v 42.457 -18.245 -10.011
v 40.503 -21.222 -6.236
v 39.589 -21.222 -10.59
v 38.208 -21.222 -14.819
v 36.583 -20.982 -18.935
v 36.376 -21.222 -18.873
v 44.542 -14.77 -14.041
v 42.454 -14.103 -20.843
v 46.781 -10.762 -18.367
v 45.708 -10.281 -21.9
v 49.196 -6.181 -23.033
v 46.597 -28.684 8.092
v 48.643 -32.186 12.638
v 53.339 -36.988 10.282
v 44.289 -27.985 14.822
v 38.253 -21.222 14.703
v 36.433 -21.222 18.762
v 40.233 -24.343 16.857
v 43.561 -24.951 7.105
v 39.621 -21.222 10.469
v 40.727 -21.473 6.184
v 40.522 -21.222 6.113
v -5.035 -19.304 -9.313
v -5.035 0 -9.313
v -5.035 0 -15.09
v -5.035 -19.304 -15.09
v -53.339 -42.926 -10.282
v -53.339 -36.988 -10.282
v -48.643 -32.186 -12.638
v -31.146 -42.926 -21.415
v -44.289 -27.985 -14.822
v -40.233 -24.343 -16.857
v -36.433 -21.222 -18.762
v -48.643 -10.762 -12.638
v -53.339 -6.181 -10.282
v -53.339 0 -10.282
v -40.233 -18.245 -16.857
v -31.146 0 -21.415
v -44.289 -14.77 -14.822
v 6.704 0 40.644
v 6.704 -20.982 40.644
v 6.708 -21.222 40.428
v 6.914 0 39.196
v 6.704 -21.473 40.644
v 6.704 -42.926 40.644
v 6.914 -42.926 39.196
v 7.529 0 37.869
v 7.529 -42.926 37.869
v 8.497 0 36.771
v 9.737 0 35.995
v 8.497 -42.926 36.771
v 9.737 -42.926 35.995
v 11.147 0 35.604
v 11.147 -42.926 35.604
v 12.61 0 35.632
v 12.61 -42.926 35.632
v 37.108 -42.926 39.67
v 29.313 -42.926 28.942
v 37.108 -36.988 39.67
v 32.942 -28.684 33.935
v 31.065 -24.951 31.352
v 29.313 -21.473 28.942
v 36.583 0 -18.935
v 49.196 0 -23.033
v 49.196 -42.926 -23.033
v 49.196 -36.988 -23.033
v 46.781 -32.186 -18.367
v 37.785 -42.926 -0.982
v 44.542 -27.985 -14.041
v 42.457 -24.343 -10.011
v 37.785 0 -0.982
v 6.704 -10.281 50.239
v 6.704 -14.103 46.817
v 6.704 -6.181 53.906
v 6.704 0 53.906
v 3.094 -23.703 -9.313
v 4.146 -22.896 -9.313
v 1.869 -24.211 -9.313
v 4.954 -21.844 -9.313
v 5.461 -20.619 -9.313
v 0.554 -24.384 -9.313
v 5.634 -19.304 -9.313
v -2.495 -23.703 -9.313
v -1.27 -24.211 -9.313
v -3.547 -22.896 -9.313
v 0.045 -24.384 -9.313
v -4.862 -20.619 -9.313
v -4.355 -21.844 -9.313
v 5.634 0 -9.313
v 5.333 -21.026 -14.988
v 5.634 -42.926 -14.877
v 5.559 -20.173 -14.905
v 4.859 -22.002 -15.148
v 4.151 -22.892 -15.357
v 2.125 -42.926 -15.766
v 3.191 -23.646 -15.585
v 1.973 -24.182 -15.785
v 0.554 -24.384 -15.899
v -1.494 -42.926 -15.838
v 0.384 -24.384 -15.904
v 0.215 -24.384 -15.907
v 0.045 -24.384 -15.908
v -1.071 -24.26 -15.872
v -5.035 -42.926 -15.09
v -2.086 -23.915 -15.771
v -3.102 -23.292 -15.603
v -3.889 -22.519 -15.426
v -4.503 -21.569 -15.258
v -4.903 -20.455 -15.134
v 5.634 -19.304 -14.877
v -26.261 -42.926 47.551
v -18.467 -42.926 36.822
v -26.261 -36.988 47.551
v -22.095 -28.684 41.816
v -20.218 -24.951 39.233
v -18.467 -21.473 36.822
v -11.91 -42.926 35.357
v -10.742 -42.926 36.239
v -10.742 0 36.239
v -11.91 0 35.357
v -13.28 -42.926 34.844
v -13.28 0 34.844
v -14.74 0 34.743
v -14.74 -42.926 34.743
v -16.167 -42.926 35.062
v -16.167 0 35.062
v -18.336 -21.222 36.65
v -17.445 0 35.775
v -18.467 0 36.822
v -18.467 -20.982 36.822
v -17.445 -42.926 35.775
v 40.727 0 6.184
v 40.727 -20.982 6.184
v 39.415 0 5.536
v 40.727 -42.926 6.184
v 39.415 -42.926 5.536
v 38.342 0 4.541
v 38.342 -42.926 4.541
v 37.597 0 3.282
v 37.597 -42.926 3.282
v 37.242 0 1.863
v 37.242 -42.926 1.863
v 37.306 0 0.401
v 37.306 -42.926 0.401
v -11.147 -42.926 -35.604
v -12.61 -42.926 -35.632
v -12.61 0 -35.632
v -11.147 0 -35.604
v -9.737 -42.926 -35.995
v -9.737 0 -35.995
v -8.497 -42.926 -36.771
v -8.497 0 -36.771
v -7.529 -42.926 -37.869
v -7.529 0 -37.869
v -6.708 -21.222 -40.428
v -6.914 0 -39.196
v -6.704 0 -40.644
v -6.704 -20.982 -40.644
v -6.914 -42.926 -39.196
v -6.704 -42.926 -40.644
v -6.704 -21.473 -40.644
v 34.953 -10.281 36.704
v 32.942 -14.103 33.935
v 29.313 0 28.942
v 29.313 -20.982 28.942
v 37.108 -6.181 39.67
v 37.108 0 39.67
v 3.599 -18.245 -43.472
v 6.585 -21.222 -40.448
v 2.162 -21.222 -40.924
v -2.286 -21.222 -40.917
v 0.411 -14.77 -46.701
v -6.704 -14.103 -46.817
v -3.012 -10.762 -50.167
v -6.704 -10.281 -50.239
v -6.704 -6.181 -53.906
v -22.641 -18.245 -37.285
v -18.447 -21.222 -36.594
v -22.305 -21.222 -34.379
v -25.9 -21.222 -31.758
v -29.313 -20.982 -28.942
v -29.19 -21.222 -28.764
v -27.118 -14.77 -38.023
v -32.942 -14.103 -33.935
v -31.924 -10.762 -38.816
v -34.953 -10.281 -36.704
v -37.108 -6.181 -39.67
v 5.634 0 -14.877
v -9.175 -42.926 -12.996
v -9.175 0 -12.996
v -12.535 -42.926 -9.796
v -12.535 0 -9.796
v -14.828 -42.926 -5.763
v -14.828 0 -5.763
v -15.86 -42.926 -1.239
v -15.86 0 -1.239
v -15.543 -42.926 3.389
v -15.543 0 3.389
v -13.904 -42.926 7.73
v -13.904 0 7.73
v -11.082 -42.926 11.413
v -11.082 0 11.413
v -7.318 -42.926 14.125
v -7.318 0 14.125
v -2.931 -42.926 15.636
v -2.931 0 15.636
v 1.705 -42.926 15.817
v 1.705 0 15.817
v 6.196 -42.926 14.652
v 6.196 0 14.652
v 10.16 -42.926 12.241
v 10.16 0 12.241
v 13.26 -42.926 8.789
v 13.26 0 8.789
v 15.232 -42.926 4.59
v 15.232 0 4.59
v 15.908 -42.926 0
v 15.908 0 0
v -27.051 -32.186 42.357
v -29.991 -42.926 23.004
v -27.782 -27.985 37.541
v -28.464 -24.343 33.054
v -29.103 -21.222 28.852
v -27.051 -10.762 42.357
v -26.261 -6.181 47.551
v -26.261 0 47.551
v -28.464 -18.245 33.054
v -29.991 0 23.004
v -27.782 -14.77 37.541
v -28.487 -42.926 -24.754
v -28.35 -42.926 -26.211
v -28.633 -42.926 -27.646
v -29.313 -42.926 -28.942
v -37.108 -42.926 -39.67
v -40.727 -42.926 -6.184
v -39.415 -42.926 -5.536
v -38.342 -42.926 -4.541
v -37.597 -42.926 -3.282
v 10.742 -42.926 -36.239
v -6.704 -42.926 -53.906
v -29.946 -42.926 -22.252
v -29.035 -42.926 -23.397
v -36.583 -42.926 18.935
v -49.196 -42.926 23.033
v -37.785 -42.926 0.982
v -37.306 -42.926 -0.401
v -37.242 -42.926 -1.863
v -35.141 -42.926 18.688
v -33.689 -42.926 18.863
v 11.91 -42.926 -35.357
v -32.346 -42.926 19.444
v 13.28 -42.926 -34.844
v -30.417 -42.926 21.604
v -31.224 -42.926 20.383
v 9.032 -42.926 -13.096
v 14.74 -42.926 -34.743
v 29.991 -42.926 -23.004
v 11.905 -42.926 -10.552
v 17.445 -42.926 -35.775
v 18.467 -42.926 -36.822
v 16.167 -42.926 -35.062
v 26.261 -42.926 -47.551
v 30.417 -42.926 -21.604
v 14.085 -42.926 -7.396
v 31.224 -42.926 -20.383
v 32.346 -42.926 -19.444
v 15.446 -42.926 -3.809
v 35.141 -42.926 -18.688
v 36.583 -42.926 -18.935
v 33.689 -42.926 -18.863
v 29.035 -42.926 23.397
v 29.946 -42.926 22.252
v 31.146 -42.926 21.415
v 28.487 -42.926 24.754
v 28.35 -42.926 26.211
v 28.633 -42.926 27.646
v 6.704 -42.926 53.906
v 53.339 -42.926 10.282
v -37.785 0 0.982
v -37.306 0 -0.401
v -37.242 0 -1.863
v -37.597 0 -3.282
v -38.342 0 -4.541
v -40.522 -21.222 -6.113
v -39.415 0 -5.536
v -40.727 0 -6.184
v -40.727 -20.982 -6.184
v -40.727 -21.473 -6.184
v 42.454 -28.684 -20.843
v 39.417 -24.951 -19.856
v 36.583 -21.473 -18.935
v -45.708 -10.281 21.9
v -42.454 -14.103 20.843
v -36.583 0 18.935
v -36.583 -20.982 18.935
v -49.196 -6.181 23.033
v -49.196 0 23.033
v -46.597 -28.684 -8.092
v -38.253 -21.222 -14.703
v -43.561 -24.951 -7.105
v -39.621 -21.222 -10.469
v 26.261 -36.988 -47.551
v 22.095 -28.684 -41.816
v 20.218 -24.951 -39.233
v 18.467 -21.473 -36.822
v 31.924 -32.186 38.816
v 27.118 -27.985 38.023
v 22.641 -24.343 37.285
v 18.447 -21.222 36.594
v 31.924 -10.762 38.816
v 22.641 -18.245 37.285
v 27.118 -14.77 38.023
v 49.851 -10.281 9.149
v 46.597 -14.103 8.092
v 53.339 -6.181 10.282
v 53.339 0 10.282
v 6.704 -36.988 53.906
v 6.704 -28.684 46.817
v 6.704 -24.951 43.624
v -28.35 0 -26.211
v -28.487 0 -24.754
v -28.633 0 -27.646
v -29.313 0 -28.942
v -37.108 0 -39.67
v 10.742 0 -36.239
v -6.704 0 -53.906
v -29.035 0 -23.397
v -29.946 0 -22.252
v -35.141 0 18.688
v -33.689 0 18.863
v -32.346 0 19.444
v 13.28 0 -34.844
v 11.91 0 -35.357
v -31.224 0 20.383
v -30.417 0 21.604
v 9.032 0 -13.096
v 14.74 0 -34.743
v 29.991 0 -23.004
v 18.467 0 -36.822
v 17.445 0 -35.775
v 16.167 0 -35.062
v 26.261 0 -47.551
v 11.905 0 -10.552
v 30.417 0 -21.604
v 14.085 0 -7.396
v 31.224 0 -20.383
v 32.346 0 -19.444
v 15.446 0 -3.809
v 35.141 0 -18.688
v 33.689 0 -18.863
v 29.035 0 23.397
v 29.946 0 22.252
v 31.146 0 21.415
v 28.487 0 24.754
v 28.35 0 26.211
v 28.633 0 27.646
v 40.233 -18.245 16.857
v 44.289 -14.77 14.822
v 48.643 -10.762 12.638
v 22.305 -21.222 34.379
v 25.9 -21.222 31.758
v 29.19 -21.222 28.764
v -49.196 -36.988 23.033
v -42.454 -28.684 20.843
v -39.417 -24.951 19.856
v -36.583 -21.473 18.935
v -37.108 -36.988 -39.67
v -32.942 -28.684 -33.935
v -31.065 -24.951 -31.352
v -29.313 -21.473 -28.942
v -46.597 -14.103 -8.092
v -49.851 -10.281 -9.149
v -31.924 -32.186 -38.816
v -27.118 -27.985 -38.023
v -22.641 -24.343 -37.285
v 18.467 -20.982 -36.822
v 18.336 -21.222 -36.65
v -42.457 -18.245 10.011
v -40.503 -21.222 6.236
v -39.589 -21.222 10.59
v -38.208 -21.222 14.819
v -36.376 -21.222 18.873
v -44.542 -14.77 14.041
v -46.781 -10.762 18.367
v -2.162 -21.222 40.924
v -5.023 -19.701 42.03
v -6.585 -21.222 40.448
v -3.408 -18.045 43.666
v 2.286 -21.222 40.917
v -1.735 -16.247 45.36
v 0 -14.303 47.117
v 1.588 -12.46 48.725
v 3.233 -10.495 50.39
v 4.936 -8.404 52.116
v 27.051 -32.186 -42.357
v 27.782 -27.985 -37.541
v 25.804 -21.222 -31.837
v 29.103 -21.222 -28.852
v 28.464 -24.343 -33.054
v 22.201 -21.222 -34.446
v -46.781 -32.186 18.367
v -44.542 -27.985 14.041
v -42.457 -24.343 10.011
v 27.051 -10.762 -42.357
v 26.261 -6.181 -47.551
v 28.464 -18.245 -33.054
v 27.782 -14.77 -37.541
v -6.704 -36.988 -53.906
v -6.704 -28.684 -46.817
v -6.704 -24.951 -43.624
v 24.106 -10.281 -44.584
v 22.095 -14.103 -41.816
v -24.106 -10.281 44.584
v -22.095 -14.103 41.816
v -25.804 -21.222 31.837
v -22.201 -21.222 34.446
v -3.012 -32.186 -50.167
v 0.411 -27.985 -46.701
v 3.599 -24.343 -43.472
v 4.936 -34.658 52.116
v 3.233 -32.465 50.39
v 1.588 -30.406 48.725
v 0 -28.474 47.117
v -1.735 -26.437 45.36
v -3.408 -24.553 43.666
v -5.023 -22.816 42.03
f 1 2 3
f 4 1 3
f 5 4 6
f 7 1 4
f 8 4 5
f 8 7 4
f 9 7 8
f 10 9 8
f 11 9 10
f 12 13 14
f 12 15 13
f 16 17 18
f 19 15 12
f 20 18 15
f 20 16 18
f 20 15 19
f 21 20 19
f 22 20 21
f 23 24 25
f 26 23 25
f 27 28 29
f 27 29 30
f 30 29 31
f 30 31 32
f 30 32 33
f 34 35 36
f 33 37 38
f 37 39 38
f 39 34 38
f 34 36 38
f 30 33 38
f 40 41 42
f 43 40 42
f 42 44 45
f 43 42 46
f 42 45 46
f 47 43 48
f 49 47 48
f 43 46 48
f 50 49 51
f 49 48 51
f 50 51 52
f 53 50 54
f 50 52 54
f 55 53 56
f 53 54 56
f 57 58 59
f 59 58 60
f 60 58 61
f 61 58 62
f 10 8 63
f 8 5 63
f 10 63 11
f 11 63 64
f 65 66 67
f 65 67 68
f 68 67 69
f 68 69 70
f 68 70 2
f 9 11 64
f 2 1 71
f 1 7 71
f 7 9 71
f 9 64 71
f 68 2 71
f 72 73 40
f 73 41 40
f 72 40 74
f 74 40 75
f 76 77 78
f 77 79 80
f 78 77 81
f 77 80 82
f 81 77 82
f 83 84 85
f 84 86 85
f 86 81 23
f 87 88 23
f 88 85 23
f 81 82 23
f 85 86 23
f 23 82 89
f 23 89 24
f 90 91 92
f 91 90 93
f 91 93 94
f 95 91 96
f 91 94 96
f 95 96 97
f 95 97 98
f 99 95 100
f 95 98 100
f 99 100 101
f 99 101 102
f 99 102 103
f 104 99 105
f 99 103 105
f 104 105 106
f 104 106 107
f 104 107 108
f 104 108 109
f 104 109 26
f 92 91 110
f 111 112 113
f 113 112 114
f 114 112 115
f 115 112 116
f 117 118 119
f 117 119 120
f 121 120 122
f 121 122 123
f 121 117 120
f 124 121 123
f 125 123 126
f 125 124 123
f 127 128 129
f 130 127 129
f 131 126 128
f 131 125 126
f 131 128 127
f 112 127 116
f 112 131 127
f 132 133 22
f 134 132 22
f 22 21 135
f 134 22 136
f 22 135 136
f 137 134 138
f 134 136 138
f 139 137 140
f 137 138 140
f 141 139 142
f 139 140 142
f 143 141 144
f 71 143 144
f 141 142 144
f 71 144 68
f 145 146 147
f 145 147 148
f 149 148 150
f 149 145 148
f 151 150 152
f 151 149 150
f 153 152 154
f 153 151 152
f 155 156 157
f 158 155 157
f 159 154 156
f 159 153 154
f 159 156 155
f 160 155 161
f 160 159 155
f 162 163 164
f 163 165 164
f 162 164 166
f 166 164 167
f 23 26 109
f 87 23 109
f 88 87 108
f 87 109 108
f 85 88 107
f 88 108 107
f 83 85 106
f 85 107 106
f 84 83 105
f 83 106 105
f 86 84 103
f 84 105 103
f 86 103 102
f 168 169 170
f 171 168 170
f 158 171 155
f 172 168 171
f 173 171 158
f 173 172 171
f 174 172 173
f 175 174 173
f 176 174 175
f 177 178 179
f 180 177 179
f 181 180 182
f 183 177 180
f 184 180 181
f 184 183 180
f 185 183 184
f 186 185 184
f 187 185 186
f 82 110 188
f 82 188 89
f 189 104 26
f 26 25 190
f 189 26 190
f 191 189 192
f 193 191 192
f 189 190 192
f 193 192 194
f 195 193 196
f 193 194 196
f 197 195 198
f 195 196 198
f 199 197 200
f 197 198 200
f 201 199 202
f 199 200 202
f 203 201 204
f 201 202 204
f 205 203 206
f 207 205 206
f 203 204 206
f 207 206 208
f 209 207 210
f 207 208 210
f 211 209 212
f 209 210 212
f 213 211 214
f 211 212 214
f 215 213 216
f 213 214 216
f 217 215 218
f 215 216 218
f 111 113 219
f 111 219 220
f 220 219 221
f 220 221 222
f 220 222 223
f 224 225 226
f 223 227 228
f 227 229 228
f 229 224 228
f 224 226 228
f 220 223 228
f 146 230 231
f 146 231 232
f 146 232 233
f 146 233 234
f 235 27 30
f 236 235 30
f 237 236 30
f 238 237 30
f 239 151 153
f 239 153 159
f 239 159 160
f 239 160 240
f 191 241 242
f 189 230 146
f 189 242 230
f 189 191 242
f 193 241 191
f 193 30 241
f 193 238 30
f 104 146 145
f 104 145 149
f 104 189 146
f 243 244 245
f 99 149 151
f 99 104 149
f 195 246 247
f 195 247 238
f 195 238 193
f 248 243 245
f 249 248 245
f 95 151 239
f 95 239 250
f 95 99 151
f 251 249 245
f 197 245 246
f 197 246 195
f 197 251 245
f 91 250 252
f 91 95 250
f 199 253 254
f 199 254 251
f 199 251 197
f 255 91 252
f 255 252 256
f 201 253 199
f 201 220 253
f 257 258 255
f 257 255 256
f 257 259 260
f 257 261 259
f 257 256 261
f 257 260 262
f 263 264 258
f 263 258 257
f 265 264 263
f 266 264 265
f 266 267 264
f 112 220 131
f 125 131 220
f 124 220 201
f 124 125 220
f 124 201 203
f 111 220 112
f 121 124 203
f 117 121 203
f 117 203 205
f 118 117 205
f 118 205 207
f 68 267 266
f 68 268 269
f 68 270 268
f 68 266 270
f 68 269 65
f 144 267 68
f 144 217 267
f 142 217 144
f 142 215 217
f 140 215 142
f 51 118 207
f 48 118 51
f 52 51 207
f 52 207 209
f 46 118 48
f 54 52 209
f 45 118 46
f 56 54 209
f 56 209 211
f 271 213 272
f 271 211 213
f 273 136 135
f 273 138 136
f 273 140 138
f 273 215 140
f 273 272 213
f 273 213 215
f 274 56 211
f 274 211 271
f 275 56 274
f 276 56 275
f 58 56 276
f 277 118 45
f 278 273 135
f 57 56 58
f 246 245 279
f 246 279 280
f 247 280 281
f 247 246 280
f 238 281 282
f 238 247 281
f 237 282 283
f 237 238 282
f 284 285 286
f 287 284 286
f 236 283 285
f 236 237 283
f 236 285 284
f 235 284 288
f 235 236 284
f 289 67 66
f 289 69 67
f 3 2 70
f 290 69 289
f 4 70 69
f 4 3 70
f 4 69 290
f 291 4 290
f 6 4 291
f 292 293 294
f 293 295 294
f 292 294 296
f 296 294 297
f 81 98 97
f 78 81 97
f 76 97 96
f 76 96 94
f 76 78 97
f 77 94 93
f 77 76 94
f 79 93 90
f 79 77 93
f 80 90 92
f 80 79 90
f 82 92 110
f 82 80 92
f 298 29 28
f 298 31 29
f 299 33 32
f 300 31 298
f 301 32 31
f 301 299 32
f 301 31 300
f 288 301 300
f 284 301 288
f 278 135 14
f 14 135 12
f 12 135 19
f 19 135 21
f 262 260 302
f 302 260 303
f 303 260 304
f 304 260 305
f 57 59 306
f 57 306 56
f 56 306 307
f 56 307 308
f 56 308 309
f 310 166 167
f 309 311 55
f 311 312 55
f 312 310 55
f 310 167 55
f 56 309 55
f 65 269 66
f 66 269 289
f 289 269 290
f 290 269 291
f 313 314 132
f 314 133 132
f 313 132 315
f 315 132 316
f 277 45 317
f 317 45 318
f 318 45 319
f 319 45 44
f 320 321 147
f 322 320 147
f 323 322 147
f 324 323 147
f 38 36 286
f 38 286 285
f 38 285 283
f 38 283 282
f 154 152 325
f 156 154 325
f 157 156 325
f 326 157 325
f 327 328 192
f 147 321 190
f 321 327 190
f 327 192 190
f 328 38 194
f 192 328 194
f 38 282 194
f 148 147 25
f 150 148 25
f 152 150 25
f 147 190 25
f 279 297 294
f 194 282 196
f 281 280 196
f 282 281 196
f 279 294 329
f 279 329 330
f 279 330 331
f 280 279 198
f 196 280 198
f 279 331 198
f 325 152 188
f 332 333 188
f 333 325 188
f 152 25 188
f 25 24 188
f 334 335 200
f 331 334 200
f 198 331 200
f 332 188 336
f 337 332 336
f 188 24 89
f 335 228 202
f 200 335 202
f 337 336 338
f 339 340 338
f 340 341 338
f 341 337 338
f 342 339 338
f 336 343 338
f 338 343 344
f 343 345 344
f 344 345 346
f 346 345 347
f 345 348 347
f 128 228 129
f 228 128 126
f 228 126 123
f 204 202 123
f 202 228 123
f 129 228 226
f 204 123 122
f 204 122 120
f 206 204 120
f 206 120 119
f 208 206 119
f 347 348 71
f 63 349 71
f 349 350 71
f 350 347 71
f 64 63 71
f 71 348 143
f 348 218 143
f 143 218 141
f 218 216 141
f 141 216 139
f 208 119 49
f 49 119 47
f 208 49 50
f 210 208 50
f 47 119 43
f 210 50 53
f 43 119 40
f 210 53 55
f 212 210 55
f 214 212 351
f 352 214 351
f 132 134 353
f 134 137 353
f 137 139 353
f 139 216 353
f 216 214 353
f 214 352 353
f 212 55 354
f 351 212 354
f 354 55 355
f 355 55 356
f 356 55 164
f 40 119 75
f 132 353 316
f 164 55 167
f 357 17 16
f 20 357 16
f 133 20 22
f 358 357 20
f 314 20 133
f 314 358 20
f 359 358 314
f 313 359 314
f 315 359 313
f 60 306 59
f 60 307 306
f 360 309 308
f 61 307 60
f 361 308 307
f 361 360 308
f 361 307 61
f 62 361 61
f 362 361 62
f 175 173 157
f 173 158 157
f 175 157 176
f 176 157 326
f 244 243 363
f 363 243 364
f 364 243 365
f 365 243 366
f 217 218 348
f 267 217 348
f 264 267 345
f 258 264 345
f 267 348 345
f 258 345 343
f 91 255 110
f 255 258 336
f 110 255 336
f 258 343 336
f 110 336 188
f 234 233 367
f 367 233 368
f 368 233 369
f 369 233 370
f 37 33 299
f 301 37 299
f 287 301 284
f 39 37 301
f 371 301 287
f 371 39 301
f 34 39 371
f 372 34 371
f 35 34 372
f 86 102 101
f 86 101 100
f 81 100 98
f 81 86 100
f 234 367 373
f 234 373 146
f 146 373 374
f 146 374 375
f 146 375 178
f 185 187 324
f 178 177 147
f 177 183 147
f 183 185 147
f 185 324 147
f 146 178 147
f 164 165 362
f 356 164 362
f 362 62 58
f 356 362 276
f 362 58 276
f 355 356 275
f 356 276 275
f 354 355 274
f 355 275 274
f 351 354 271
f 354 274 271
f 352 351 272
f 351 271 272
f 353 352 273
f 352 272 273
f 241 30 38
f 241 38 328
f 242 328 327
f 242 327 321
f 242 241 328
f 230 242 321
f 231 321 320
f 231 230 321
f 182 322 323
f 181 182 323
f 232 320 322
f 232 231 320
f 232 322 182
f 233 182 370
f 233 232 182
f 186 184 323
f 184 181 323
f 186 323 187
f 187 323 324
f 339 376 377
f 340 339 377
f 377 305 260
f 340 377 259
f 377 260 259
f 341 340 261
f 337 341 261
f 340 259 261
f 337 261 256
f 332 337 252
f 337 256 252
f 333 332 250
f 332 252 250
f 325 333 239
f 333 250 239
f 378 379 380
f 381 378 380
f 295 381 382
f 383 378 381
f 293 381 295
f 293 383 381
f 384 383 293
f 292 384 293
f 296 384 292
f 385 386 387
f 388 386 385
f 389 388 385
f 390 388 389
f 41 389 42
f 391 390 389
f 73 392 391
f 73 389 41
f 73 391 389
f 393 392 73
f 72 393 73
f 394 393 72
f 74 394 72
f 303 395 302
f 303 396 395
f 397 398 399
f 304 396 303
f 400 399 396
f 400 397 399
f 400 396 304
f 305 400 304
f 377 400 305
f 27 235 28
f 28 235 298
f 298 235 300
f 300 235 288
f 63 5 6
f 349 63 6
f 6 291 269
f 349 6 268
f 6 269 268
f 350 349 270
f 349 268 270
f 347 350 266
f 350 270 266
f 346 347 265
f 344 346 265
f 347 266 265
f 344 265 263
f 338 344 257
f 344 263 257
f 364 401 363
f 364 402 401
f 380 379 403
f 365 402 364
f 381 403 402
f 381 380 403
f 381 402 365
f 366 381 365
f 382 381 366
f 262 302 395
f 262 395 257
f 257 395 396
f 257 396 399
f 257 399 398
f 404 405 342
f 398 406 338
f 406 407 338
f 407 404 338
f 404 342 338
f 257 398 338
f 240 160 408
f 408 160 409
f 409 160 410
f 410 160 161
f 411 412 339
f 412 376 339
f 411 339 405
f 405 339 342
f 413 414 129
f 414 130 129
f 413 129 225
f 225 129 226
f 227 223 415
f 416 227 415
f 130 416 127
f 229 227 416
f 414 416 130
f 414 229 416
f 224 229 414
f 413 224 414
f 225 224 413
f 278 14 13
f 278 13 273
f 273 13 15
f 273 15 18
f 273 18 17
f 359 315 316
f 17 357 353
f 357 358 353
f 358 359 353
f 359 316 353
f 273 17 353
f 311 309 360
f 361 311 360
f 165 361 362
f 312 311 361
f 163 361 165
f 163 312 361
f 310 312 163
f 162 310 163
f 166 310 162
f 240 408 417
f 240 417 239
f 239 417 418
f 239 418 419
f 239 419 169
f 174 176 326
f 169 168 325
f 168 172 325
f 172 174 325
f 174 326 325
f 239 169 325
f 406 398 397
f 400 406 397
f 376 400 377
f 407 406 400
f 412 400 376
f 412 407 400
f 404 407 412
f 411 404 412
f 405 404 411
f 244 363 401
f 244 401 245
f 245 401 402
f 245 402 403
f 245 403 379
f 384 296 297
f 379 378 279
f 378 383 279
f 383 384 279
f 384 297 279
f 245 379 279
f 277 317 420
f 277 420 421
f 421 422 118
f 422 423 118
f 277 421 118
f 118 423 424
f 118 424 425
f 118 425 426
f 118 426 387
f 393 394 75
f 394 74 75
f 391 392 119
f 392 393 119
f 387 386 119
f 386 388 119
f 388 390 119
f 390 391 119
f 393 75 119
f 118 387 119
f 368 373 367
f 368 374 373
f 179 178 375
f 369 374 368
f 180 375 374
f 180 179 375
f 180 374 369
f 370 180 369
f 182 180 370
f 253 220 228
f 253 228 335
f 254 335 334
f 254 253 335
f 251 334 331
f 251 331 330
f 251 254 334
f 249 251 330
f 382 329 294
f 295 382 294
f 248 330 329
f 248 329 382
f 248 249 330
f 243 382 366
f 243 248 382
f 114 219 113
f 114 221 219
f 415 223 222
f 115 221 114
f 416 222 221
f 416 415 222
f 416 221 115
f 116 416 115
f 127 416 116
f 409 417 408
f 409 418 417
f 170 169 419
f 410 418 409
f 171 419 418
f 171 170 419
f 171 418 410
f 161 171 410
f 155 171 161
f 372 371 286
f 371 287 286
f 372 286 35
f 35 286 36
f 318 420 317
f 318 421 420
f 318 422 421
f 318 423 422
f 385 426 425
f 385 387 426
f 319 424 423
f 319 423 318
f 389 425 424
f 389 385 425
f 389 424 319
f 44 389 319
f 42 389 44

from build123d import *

# Parameters (mm, degrees)
F1_DEPTH = 42.926
F2_R     = 5.08
F5_DEPTH = 24.384
F6_R     = 5.08


with BuildPart() as f1:
    # F0 (on Front) → F1 (new body)
    with BuildSketch(Plane.XZ):
        Polygon((6.703672, 53.90551), (-14.948268, 31.979494), (-26.26148, 47.550793), (-30.890478, 17.085582), (-49.195638, 23.033289), (-35.033575, -4.334441), (-53.338735, -10.282148), (-25.795037, -24.098855), (-37.108248, -39.670155), (-6.703672, -34.658326), (-6.703672, -53.90551), (14.948268, -31.979494), (26.26148, -47.550793), (30.890478, -17.085582), (49.195638, -23.033289), (35.033575, 4.334441), (53.338735, 10.282148), (25.795037, 24.098855), (37.108248, 39.670155), (6.703672, 34.658326), align=None)
        with BuildLine():
            ThreePointArc((-5.035342, -15.090275), (-9.299672, 12.906865), (15.908207, 0))
            ThreePointArc((15.908207, 0), (13.090102, -9.039928), (5.634228, -14.877047))
            ThreePointArc((5.634228, -14.877047), (0.317856, -15.905032), (-5.035342, -15.090275))
        make_face(mode=Mode.SUBTRACT)
    extrude(amount=F1_DEPTH)

    # F2
    f2_edges = [f1.edges().sort_by_distance(p)[0] for p in [
        (25.795037, -21.463, 24.098855),
        (6.703672, -21.463, 34.658326),
        (35.033575, -21.463, 4.334441),
        (30.890478, -21.463, -17.085582),
        (14.948268, -21.463, -31.979494),
        (-6.703672, -21.463, -34.658326),
        (-25.795037, -21.463, -24.098855),
        (-35.033575, -21.463, -4.334441),
        (-30.890478, -21.463, 17.085582),
        (-14.948268, -21.463, 31.979494),
    ]]
    fillet(f2_edges, radius=F2_R)

    # F3 (on Right) → F4 (revolve, cut)
    with BuildSketch(Plane.YZ):
        Polygon((-6.094482, 54.397043), (-37.077803, 54.397043), (-21.222165, 40.98073), align=None)
    revolve(axis=Axis((0, -28.662119, 0), (0, 1, 0)), mode=Mode.SUBTRACT)

    # F0 (on Front) → F5 (join)
    with BuildSketch(Plane.XZ):
        with BuildLine():
            Line((-5.035342, -9.313321), (-5.035342, -15.090275))
            ThreePointArc((-5.035342, -15.090275), (0.317856, -15.905032), (5.634228, -14.877047))
            Line((5.634228, -14.877047), (5.634228, -9.313321))
            Line((5.634228, -9.313321), (-5.035342, -9.313321))
        make_face()
    extrude(amount=F5_DEPTH)

    # F6
    f6_edges = [f1.edges().sort_by_distance(p)[0] for p in [
        (5.634228, -24.384, -12.095184),
        (-5.035342, -24.384, -12.201798),
    ]]
    fillet(f6_edges, radius=F6_R)


solid = f1.part
